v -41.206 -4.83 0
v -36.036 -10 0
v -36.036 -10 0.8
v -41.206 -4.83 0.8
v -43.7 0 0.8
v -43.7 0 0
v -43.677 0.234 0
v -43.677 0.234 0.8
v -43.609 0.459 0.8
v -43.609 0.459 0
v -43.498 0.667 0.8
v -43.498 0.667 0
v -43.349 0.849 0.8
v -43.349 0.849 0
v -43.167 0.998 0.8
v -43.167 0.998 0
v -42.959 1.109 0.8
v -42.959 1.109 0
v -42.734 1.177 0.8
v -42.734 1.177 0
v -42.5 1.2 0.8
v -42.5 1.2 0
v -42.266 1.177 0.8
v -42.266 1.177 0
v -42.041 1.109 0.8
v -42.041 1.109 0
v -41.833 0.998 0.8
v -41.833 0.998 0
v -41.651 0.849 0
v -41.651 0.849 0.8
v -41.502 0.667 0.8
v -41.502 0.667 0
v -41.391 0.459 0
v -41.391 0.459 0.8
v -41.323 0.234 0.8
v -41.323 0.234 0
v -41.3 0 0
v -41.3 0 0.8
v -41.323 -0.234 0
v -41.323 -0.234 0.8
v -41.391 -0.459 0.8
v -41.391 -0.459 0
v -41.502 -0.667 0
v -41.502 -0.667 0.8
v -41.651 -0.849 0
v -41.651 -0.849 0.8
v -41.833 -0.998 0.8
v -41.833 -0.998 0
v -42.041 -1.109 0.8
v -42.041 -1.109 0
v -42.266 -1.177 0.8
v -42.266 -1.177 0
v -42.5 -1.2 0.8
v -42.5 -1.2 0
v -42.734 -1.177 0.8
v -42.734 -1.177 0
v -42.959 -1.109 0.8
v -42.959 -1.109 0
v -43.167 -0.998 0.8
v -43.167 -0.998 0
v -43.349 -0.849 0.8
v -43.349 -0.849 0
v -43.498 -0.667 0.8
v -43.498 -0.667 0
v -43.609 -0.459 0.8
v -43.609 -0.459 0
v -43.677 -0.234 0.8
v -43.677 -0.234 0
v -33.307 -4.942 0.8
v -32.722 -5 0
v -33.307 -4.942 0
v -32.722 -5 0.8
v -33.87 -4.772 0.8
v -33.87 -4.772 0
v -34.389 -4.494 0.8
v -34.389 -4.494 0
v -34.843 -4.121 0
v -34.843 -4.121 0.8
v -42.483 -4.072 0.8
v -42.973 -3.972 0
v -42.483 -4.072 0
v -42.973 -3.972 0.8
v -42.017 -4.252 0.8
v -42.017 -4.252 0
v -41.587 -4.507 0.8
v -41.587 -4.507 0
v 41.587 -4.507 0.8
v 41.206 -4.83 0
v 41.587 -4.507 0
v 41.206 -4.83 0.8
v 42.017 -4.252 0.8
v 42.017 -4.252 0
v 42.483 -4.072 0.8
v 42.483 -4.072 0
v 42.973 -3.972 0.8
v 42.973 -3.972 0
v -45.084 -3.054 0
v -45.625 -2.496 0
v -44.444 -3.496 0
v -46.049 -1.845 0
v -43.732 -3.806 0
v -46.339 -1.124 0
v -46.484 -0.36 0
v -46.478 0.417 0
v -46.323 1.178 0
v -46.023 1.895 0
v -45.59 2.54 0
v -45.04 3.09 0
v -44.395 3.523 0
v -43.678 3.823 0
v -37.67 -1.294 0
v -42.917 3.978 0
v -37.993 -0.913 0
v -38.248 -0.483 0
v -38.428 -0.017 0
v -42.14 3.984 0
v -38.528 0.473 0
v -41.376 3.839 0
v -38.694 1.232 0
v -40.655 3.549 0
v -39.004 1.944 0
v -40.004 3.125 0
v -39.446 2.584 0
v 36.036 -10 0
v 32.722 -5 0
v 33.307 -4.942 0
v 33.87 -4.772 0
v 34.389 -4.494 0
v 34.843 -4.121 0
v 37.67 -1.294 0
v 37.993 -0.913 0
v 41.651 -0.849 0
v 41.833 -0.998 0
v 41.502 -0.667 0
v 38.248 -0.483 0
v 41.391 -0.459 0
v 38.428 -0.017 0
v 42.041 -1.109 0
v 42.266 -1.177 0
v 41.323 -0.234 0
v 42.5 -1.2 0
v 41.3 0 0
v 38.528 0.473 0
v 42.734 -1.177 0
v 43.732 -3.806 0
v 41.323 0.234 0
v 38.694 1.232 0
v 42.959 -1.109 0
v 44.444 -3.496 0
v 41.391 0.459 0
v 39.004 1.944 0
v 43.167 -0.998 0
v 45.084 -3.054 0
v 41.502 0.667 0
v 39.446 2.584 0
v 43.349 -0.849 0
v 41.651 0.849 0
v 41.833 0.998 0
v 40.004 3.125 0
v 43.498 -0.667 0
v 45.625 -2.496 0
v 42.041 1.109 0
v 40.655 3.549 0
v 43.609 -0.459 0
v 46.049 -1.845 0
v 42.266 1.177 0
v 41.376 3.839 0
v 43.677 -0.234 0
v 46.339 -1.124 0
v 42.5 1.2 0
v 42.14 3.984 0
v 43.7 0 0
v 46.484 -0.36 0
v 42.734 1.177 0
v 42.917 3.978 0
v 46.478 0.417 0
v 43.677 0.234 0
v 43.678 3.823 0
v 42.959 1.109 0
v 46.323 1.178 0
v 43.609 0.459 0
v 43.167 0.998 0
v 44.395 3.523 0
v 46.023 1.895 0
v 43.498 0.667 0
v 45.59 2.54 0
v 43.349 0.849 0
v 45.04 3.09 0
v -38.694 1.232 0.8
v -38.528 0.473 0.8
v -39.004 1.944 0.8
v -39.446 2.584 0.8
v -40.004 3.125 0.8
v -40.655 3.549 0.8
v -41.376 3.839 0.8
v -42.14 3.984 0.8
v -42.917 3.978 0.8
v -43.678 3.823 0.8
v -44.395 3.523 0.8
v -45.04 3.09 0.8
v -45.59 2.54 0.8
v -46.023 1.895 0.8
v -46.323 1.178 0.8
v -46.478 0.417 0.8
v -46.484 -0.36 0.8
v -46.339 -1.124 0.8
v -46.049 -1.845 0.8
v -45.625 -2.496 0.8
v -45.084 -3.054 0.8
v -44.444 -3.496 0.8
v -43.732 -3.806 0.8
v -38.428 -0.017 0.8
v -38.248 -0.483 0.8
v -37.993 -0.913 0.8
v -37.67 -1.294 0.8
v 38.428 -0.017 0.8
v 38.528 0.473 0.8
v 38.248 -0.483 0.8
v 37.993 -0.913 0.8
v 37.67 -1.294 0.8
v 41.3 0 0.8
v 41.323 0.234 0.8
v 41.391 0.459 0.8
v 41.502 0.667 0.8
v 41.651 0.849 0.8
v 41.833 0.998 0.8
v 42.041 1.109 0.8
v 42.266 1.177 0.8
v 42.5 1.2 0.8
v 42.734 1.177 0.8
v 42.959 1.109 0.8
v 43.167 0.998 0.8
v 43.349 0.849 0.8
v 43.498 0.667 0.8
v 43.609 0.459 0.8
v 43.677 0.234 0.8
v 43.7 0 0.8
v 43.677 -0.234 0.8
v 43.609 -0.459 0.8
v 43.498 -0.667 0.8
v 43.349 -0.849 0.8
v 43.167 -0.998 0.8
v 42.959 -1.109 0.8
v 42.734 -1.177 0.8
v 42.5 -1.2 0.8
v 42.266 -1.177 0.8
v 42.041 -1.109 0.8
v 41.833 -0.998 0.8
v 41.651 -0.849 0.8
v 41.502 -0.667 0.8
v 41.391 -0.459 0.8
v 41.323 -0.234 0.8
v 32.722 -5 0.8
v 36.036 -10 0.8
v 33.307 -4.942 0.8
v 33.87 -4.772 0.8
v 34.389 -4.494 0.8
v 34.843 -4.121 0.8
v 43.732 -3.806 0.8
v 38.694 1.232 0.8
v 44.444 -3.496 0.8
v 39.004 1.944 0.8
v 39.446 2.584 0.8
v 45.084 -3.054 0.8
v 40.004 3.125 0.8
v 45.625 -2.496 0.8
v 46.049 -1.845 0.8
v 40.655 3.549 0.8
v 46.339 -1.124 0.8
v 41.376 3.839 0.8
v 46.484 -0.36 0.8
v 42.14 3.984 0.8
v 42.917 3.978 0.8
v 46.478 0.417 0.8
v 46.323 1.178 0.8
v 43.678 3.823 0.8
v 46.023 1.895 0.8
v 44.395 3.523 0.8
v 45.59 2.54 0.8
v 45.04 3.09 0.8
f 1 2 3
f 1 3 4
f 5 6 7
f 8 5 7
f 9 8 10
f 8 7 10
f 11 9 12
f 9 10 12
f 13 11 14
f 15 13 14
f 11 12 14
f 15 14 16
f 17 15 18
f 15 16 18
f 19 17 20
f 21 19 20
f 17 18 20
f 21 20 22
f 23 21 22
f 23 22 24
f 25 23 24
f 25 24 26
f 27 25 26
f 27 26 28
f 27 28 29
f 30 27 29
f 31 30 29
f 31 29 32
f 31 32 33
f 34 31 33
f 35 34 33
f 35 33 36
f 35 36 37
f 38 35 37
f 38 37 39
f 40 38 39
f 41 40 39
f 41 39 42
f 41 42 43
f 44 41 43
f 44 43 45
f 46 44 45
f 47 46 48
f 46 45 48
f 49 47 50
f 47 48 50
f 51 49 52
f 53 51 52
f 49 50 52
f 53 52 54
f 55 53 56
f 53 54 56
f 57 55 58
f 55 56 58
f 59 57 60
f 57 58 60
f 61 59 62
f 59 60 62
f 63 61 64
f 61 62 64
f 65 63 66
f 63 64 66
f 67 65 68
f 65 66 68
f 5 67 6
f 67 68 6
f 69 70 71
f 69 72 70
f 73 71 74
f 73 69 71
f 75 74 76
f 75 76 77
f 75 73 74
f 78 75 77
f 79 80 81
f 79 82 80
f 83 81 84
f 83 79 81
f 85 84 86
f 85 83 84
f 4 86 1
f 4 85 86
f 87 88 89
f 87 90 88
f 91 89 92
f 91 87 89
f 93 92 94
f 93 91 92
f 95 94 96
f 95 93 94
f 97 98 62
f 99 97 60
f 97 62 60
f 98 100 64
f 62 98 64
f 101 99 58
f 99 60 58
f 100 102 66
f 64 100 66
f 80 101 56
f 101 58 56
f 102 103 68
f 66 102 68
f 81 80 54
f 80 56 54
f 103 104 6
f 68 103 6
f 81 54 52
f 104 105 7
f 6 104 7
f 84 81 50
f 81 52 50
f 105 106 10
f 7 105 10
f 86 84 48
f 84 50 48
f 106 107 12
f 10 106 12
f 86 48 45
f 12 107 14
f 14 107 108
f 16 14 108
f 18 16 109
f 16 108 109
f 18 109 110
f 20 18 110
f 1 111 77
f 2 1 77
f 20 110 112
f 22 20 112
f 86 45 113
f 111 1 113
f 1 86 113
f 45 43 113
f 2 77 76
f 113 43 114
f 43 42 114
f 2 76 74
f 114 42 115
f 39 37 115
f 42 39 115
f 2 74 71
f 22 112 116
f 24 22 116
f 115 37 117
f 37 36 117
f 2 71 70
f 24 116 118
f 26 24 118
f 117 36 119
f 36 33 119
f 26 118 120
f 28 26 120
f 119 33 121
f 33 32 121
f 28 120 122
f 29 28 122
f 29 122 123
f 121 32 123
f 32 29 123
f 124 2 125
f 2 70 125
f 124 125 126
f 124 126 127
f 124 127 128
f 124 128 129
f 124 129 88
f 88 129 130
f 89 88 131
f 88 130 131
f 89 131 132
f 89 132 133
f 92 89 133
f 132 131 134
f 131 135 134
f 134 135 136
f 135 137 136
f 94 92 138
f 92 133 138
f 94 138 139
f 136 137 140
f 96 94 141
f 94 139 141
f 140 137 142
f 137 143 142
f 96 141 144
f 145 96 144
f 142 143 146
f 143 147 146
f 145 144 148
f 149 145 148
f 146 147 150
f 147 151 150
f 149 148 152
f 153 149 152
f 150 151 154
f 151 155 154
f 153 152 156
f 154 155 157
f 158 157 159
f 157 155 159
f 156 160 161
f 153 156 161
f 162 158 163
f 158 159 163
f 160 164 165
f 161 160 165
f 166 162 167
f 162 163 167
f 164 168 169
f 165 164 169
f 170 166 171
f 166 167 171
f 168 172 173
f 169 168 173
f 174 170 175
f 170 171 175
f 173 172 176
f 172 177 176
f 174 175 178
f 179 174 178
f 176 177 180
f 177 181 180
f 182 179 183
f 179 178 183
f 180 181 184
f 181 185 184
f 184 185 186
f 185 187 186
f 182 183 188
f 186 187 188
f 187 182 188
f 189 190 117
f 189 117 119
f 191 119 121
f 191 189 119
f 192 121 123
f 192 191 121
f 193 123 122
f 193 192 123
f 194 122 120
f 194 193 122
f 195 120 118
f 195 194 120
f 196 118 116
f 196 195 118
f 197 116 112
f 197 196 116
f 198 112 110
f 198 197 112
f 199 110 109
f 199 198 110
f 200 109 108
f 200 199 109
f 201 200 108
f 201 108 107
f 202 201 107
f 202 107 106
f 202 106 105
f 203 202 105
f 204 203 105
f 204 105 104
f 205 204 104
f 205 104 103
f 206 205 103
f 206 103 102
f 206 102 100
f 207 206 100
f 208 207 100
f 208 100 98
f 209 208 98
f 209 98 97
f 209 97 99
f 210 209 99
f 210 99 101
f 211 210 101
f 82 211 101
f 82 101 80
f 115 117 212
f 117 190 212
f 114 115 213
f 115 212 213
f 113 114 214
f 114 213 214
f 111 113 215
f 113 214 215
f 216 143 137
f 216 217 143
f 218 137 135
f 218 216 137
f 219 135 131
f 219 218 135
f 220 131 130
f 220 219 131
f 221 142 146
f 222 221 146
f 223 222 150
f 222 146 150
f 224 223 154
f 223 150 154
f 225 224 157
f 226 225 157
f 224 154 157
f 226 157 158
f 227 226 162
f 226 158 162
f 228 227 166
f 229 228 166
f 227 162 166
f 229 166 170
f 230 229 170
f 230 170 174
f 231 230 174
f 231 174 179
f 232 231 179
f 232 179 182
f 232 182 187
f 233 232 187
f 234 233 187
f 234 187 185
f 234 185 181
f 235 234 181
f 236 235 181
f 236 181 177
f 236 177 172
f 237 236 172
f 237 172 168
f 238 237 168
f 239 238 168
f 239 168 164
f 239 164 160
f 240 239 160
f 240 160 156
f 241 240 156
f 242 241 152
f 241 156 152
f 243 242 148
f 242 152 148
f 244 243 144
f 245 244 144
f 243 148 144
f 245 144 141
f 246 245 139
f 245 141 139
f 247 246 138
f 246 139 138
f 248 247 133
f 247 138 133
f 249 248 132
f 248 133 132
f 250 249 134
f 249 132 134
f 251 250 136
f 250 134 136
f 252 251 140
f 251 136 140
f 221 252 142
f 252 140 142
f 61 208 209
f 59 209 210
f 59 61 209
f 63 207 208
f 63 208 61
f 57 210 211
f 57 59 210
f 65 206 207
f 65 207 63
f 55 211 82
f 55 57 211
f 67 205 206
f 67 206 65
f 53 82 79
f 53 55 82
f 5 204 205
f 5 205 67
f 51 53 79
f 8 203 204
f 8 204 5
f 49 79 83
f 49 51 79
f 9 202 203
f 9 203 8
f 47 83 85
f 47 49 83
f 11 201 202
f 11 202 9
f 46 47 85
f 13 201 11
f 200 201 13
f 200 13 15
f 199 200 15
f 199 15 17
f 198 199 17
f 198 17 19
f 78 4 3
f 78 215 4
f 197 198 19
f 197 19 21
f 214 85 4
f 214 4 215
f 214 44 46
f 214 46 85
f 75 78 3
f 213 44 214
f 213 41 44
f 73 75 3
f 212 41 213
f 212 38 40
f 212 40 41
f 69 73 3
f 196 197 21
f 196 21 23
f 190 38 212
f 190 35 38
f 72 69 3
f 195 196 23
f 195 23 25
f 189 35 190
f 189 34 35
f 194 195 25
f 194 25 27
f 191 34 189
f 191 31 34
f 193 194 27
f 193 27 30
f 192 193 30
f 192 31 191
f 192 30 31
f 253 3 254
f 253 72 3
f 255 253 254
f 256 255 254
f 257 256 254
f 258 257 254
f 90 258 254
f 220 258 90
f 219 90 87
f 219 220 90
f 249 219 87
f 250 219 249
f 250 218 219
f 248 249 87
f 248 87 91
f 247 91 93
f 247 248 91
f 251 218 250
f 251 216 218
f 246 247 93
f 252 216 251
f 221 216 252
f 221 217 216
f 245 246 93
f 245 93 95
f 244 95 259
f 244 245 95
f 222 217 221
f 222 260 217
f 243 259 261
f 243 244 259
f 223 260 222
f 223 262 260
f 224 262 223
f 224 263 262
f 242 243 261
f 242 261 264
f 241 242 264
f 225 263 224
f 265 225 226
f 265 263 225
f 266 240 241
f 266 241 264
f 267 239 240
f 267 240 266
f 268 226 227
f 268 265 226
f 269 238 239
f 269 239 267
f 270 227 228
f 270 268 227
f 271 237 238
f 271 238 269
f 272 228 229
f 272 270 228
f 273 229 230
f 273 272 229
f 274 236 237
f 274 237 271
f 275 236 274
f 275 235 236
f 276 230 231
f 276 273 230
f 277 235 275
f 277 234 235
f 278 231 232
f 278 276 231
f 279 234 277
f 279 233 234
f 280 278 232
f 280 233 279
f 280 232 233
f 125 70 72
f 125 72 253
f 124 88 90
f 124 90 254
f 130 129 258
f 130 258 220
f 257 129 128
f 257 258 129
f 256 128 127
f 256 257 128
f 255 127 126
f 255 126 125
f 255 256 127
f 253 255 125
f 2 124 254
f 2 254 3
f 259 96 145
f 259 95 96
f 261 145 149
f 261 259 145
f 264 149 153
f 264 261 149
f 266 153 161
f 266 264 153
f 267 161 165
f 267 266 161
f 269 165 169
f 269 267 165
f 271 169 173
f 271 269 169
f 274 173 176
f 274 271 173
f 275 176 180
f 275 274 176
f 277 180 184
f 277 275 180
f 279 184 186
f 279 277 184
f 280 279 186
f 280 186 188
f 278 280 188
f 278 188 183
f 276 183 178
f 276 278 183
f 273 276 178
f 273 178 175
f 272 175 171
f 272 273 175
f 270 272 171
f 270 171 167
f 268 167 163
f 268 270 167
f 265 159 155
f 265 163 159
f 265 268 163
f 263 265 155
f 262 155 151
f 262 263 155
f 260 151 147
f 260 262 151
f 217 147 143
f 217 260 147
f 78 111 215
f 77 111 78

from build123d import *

# Parameters (mm, degrees)
BOSS_EXTRUDE1_DEPTH      = 0.8
SKETCH7_R                = 4
BOSS_EXTRUDE2_DEPTH      = 0.8
FILLET1_R                = 3
M2_CLEARANCE_HOLE1_D     = 2.4
M2_CLEARANCE_HOLE1_DEPTH = 30.5


with BuildPart() as part:
    # Sketch3 → Boss-Extrude1 (new body)
    with BuildSketch(Plane.XY):
        with BuildLine():
            Line((-40.732233047, 1.767766953), (-33.964466094, -5))
            Line((-33.964466094, -5), (33.964466094, -5))
            Line((33.964466094, -5), (40.732233047, 1.767766953))
            ThreePointArc((40.732233047, 1.767766953), (44.267766953, 1.767766953), (44.267766953, -1.767766953))
            Line((44.267766953, -1.767766953), (36.035533906, -10))
            Line((36.035533906, -10), (-36.035533906, -10))
            Line((-36.035533906, -10), (-44.267766953, -1.767766953))
            ThreePointArc((-44.267766953, -1.767766953), (-44.267766953, 1.767766953), (-40.732233047, 1.767766953))
        make_face()
    extrude(amount=BOSS_EXTRUDE1_DEPTH)

    # Sketch7 → Boss-Extrude2 (add)
    with BuildSketch(Plane.XY.offset(0.8)):
        with Locations((-42.5, 0)):
            Circle(SKETCH7_R)
        with Locations((42.5, 0)):
            Circle(SKETCH7_R)
    extrude(amount=-BOSS_EXTRUDE2_DEPTH)

    # Fillet1
    fillet1_edges = [part.edges().sort_by_distance(p)[0] for p in [
        (-33.964466094, -5, 0.4),
        (33.964466094, -5, 0.4),
        (-42.059826736, -3.97570717, 0.4),
        (-38.52429283, -0.440173264, 0.4),
        (42.059826736, -3.97570717, 0.4),
        (38.52429283, -0.440173264, 0.4),
    ]]
    fillet(fillet1_edges, radius=FILLET1_R)

    # M2 Clearance Hole1
    with Locations(Plane.XY.offset(0.8)):
        with Locations((-42.5, 0), (42.5, 0)):
            Hole(M2_CLEARANCE_HOLE1_D / 2, depth=M2_CLEARANCE_HOLE1_DEPTH)


solid = part.part
